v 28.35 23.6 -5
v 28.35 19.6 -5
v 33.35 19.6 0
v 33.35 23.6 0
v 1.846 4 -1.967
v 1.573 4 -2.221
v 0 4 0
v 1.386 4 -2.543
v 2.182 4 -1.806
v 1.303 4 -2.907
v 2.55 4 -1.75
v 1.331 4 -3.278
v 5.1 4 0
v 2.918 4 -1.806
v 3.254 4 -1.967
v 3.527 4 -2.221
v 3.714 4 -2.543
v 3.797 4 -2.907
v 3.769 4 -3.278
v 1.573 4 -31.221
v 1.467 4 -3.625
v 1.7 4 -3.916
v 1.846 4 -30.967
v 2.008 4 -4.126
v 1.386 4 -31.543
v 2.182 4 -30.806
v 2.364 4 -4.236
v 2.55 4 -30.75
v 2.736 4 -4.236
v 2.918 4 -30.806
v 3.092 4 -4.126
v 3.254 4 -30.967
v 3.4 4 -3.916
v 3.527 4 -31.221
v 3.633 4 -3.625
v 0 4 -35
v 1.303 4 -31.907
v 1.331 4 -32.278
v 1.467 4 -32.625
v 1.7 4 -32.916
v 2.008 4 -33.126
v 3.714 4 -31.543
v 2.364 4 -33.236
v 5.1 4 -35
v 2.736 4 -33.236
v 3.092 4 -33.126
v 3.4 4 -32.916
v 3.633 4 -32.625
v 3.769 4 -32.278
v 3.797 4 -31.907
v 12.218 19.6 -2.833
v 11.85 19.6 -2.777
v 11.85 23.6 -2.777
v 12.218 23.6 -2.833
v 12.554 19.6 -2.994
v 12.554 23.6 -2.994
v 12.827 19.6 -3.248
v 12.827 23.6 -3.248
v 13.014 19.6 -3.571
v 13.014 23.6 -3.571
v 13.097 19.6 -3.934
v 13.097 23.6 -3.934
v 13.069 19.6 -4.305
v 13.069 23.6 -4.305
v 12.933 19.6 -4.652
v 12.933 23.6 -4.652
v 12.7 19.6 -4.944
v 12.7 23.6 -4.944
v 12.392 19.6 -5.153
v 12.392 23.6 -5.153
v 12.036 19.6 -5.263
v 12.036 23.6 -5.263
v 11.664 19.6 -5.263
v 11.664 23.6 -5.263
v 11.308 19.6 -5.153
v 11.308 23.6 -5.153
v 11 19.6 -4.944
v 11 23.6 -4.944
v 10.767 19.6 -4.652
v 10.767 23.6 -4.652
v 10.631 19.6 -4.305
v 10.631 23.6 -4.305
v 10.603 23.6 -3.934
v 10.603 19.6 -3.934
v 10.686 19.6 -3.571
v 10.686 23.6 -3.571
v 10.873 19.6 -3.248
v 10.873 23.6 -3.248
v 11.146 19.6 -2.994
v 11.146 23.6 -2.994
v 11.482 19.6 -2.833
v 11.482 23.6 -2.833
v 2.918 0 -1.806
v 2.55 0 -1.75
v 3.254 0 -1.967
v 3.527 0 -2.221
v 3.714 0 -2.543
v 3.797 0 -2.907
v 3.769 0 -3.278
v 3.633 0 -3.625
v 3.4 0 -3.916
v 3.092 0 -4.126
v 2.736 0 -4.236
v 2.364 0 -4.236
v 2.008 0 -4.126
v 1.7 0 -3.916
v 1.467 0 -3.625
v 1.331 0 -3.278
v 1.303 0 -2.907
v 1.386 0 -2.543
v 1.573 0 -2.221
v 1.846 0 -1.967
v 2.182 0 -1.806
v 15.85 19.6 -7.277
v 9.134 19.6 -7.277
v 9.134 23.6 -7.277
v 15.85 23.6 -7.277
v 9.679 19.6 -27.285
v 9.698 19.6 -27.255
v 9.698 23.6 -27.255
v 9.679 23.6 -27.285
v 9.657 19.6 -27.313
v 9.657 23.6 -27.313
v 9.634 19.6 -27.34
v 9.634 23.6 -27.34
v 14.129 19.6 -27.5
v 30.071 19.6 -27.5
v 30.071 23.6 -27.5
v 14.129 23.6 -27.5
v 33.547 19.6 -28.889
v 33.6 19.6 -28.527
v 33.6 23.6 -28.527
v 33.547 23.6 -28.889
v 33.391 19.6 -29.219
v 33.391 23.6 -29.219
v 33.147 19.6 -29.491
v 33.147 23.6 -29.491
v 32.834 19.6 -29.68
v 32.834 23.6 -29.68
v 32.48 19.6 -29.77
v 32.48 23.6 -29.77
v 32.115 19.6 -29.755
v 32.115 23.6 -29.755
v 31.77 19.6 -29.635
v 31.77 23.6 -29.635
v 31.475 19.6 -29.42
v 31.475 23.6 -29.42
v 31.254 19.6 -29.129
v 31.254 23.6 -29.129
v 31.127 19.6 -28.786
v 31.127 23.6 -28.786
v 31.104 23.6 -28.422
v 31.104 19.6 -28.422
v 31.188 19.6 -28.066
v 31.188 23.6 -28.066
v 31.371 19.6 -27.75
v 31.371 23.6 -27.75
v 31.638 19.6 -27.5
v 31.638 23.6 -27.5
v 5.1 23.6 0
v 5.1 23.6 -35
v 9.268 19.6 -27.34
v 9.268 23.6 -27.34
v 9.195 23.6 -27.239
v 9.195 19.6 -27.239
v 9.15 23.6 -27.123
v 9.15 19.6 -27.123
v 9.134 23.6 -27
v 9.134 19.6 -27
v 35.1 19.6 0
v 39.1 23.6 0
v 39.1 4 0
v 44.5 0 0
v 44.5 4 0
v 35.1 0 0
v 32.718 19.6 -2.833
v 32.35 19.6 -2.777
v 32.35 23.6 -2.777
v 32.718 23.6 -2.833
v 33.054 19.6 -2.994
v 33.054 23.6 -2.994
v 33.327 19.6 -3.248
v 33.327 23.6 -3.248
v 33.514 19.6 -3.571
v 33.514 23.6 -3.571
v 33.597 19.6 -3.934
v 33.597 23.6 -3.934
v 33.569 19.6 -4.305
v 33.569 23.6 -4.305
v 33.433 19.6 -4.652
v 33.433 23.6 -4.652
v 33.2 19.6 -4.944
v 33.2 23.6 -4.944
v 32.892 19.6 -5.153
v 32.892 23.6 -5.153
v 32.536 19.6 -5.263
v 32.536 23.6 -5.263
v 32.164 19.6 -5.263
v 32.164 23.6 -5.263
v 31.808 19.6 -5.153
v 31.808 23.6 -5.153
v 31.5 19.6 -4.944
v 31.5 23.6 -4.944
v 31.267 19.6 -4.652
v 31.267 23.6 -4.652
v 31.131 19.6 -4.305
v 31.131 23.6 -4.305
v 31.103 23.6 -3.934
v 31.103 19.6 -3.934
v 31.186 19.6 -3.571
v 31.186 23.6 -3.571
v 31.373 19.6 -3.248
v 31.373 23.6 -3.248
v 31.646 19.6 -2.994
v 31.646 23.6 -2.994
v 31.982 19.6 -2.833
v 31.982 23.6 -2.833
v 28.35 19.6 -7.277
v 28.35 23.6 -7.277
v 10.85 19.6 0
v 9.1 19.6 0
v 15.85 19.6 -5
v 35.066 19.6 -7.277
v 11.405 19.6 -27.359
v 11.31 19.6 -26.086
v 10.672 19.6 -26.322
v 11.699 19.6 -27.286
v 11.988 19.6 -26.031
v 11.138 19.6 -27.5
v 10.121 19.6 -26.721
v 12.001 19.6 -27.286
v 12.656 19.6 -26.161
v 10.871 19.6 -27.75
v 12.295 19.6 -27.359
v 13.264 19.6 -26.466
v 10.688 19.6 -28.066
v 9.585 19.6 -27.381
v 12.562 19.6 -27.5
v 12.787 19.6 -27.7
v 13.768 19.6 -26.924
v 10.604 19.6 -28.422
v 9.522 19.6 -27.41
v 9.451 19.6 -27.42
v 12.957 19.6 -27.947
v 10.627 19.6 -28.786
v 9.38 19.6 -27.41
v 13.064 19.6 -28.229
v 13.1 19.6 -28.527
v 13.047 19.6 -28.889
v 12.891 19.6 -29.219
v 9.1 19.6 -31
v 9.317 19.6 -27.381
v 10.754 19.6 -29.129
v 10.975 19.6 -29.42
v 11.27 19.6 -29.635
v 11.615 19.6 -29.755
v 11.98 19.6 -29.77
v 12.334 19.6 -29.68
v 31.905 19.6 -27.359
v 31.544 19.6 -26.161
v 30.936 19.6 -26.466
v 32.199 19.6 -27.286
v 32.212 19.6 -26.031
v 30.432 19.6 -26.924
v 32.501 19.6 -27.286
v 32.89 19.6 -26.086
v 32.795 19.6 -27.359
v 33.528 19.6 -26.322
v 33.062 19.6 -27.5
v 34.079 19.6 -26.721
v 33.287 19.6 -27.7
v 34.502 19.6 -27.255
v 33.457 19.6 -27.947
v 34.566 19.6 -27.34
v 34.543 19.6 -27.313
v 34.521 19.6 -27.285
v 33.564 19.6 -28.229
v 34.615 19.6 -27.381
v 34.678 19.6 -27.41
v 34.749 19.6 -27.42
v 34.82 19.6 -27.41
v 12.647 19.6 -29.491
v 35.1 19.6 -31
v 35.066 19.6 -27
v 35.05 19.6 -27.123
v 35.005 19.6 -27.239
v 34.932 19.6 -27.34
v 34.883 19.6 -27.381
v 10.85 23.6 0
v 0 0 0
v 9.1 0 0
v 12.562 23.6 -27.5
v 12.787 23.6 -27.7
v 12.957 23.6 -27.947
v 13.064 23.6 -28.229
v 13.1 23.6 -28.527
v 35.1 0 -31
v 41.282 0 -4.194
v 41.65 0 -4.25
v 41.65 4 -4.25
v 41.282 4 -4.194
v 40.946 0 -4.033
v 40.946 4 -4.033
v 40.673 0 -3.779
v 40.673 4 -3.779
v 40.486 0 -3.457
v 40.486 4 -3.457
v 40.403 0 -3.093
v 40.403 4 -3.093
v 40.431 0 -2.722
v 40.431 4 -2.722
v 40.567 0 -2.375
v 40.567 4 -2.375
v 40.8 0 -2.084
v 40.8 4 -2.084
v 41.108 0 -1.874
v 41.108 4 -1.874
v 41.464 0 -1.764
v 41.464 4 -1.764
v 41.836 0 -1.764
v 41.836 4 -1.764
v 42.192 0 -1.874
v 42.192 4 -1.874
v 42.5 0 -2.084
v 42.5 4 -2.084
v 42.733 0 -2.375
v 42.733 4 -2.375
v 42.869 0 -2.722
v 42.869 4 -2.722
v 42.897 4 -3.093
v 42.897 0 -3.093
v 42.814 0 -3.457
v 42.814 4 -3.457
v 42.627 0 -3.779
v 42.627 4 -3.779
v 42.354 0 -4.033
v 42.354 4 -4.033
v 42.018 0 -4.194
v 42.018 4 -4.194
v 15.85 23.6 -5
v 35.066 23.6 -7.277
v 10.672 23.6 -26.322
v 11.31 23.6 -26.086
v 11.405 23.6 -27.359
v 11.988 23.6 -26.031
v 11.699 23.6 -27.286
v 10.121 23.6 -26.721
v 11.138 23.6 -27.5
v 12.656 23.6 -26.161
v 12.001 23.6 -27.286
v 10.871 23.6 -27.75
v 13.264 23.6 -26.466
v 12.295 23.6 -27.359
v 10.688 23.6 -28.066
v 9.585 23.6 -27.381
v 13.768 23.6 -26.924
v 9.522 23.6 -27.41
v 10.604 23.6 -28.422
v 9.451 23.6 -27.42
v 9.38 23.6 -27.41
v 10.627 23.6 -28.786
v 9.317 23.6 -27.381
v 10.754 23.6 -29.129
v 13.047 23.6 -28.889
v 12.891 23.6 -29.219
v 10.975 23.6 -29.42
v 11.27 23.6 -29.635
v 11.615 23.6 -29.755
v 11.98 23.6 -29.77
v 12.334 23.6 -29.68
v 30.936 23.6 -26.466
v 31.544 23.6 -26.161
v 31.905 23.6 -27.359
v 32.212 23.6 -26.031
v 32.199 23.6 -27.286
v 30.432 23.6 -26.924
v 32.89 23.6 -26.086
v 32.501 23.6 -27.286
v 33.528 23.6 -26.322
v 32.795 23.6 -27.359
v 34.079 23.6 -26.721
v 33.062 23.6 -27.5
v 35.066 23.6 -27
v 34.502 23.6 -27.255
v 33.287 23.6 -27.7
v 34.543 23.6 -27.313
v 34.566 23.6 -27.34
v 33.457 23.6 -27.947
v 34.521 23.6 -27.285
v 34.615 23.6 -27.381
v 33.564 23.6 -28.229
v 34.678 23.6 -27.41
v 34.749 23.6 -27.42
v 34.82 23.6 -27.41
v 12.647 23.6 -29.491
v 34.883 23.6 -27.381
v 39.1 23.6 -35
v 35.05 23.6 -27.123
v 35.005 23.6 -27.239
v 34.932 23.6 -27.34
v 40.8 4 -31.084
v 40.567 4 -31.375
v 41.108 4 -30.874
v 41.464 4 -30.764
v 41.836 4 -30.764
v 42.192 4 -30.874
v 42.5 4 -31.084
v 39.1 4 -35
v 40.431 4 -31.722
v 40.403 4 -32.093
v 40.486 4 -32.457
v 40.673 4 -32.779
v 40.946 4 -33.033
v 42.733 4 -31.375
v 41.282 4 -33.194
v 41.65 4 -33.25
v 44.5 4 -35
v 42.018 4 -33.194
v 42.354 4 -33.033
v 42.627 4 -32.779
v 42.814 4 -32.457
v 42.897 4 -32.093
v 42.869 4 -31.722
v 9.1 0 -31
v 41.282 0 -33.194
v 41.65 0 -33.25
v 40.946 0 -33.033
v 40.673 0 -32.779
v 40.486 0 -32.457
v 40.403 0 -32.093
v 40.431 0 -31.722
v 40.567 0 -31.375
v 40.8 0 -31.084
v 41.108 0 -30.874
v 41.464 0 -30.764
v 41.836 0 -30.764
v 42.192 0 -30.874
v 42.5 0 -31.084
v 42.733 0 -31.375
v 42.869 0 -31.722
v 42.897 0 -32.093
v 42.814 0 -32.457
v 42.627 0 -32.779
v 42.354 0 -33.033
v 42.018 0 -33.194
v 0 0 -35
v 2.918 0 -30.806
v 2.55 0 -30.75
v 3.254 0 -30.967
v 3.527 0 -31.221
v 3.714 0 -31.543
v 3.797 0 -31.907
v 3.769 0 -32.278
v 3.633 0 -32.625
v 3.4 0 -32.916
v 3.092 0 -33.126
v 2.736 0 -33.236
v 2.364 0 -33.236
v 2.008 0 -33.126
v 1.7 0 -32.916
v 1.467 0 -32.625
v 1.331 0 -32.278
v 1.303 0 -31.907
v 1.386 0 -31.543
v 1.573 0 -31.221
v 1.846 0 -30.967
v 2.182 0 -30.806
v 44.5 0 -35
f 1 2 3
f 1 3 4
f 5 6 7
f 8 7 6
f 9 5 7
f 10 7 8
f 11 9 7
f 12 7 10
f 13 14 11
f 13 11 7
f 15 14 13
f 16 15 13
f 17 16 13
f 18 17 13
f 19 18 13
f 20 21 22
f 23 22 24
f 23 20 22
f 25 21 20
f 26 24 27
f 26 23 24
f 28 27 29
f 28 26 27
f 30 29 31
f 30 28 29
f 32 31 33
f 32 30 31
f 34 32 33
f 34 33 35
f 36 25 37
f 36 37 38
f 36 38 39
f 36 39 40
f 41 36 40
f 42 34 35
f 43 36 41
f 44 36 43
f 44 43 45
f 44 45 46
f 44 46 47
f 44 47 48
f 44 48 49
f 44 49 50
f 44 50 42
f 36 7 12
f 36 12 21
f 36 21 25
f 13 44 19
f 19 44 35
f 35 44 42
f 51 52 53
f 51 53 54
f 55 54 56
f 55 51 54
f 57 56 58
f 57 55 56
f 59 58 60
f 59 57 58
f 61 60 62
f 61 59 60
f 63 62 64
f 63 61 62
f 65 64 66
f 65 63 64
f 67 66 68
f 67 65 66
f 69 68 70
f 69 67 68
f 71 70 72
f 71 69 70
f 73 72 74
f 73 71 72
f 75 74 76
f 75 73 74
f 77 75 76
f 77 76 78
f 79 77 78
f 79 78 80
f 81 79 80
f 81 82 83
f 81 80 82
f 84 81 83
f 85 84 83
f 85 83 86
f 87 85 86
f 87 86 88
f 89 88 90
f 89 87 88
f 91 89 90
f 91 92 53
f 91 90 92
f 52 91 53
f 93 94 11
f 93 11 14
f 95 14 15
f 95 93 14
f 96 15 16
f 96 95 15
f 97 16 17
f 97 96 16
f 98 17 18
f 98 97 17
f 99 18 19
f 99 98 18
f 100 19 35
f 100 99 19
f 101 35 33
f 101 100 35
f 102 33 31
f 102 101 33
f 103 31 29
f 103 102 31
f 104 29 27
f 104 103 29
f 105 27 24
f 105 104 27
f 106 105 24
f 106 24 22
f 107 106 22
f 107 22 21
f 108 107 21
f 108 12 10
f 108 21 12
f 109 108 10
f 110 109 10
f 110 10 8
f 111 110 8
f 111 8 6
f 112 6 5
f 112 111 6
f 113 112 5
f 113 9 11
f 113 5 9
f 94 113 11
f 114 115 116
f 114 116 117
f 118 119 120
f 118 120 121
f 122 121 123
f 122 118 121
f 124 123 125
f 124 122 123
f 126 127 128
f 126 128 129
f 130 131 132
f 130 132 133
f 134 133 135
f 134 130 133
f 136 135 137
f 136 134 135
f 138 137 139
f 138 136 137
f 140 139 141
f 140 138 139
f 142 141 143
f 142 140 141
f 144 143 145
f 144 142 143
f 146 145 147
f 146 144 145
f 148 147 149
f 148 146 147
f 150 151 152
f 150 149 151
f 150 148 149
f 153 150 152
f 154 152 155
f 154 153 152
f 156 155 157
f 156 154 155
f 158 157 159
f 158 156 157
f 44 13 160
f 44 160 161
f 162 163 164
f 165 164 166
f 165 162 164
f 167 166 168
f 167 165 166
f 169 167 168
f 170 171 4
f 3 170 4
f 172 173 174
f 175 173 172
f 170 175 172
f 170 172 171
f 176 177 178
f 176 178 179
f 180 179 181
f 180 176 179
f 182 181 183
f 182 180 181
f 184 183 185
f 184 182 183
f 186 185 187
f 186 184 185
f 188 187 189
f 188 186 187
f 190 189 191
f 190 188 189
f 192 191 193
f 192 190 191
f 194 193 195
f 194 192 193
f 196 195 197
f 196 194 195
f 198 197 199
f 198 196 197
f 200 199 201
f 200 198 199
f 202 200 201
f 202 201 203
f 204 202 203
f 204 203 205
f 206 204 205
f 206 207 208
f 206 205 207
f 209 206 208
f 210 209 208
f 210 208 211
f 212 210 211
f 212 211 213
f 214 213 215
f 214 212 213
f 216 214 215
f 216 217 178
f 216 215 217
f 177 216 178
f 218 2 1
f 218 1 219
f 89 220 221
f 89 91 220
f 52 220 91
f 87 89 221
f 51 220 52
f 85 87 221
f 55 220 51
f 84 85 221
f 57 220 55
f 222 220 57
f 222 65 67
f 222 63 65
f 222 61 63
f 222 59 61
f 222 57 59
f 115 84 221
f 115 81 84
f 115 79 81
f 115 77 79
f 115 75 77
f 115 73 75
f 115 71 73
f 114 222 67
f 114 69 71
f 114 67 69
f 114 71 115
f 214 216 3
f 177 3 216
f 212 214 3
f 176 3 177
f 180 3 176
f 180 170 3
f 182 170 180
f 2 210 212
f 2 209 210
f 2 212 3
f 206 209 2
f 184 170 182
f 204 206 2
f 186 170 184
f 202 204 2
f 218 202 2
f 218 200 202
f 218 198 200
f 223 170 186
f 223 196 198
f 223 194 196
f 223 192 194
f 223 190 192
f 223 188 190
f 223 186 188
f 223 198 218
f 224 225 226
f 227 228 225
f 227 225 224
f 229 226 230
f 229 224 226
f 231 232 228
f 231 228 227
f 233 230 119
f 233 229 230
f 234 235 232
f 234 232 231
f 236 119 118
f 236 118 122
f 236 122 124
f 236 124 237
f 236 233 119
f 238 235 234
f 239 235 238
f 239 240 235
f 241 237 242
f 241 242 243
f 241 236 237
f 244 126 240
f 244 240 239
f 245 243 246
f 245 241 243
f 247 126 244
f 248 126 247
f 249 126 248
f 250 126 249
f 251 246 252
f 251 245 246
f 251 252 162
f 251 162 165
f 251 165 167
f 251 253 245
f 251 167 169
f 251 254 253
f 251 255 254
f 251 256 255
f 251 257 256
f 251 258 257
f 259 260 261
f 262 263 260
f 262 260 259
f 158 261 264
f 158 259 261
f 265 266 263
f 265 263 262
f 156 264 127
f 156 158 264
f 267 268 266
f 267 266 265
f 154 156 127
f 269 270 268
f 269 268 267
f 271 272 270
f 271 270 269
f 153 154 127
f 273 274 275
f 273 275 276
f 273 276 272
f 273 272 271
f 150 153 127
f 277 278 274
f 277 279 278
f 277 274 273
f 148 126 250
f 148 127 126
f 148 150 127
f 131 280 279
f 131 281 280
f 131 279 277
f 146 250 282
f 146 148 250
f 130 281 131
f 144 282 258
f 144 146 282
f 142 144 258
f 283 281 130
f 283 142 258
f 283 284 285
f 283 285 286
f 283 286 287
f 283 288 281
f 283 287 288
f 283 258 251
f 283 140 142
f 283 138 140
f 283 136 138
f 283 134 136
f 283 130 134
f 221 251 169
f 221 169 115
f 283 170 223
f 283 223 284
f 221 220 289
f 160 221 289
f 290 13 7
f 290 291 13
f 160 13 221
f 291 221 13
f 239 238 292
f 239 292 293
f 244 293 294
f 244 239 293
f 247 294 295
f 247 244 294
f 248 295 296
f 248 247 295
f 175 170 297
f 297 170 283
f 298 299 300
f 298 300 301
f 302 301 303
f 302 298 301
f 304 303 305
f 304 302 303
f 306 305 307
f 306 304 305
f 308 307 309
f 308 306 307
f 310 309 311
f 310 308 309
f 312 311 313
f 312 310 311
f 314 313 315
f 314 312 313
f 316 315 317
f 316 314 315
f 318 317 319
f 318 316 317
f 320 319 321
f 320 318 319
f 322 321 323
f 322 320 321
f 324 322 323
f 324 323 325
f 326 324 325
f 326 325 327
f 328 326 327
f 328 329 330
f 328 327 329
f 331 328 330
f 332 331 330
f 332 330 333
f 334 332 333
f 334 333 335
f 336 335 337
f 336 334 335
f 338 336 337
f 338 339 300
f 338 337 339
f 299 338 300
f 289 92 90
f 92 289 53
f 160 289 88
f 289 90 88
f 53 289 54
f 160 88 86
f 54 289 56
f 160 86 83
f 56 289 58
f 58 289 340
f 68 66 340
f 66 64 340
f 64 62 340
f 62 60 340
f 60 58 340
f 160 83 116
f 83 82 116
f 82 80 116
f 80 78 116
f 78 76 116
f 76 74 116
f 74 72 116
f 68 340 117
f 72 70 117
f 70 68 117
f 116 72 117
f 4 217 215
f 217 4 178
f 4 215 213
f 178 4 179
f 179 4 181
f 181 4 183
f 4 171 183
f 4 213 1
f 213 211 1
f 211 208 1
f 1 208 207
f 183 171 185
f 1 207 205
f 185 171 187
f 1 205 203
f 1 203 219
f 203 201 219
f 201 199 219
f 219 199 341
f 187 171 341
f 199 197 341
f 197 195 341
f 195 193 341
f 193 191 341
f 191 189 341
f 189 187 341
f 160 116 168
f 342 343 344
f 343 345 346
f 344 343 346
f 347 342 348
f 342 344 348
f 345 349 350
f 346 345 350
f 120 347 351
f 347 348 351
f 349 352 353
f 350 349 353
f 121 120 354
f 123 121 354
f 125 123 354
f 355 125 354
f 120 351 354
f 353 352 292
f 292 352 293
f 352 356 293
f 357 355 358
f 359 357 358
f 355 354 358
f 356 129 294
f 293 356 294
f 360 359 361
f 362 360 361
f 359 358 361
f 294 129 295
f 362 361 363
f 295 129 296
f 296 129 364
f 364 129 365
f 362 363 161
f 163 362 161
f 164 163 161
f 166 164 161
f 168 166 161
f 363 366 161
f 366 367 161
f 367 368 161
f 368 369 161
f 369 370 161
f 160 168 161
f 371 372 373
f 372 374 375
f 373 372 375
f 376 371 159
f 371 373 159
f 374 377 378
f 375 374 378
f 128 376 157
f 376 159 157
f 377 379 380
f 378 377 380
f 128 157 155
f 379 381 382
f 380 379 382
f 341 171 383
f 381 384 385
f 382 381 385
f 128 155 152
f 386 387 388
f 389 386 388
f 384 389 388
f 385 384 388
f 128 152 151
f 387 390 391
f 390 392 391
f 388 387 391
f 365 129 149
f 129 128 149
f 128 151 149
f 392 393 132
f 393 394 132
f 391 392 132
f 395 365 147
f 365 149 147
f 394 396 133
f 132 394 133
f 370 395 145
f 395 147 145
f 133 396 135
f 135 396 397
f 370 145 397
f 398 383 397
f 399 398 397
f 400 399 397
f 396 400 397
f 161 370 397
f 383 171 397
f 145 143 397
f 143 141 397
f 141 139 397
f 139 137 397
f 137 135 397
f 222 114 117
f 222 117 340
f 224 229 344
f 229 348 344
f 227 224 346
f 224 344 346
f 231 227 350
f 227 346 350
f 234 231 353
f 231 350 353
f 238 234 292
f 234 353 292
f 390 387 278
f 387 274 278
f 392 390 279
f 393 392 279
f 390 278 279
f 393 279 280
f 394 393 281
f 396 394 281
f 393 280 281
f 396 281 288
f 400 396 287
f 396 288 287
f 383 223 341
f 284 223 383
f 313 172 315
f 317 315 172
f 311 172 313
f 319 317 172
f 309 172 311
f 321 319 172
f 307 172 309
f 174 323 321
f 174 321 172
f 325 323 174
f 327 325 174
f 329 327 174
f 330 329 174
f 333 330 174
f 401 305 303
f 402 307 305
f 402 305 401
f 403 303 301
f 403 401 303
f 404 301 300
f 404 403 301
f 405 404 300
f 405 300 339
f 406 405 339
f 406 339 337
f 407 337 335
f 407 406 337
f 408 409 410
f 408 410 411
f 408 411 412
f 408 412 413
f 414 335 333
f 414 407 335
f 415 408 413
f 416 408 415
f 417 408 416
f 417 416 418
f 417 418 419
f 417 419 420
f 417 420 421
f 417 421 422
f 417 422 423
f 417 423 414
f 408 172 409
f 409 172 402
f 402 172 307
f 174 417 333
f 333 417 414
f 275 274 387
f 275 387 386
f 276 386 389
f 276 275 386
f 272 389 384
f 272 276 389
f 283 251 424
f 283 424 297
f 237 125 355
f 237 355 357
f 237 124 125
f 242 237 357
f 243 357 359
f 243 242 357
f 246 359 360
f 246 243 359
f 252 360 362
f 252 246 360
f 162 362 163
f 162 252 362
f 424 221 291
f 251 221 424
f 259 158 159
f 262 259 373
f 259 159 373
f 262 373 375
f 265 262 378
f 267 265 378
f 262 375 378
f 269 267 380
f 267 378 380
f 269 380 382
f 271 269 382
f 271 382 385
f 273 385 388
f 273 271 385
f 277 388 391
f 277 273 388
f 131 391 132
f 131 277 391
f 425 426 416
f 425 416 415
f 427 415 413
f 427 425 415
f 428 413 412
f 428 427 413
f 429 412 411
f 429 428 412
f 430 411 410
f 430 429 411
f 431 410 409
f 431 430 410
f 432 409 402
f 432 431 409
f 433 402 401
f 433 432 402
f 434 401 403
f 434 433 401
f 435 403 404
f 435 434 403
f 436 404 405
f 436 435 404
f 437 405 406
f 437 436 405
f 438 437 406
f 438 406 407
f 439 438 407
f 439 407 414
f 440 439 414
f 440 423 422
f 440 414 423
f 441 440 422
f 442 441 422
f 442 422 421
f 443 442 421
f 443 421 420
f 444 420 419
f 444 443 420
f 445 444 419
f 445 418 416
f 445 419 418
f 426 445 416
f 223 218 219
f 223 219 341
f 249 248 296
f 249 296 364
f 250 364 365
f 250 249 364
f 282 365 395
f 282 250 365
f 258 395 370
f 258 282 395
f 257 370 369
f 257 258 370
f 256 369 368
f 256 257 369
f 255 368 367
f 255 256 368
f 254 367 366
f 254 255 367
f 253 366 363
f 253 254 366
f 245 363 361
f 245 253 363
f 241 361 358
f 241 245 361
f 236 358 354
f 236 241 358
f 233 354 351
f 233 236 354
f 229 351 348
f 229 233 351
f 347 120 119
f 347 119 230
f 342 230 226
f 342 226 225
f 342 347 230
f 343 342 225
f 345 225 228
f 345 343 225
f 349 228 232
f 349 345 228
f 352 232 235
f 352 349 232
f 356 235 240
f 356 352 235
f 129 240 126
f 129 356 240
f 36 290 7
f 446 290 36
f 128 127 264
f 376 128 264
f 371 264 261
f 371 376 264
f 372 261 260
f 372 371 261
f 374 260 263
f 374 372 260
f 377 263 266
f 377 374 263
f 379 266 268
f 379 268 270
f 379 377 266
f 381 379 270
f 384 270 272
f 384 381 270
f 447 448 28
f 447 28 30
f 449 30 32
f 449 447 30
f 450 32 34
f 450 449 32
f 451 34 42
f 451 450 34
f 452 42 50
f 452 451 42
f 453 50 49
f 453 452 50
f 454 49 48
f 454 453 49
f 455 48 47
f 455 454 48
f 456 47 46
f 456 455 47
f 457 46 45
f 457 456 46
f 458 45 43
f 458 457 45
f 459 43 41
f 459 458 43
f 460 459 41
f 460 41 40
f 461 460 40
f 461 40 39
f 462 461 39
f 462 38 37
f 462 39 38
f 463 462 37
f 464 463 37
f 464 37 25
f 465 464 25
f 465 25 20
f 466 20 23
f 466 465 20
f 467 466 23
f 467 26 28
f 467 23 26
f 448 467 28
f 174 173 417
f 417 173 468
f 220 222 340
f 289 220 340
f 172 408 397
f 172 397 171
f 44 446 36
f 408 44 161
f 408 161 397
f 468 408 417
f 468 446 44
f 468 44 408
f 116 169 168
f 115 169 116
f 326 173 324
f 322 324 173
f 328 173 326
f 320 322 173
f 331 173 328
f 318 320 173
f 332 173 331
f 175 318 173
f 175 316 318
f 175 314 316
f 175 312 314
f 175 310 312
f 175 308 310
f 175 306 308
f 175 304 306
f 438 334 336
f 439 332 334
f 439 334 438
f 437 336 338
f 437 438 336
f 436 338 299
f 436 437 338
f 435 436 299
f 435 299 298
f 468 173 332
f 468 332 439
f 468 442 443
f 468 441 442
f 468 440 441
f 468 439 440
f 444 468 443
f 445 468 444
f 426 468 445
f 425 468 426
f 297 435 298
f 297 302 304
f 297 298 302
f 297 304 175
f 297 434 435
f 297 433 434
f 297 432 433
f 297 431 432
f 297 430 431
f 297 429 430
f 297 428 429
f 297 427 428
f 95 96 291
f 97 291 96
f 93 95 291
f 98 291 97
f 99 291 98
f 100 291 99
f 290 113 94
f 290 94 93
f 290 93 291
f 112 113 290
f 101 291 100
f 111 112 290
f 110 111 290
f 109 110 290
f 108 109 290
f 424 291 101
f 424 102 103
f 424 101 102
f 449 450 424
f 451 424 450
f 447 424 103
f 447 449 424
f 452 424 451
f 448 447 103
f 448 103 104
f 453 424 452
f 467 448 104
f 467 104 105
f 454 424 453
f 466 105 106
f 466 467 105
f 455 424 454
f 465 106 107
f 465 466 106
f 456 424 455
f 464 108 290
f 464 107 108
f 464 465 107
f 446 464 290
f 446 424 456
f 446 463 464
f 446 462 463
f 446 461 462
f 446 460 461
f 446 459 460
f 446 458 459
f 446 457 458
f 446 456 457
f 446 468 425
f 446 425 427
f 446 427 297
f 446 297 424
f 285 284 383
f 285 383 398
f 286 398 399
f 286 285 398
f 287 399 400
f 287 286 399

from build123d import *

# Parameters (mm, degrees)
SKETCH1_W               = 44.5
SKETCH1_H               = 35
BOSS_EXTRUDE1_DEPTH     = 4
BOSS_EXTRUDE2_DEPTH     = 19.6
SKETCH4_W               = 26
SKETCH4_H               = 31
CUT_EXTRUDE1_DEPTH      = 4
BOSS_EXTRUDE3_DEPTH     = 4
CHAMFER1_SIZE           = 5
CUT_EXTRUDE2_DEPTH      = 62.336856783
CUT_EXTRUDE2_DEPTH_BACK = 62.336856783
SKETCH6_R               = 1.25
SKETCH7_R               = 2.5
SKETCH7_R_2             = 1.25
BOSS_EXTRUDE4_DEPTH     = 4
FILLET1_R               = 0.5
FILLET3_R               = 0.25
CUT_EXTRUDE3_DEPTH      = 60.911685095
CUT_EXTRUDE3_DEPTH_BACK = 60.911685095
SKETCH8_R               = 1.25


with BuildPart() as part:
    # Sketch1 → Boss-Extrude1 (new body)
    with BuildSketch(Plane(origin=(0, 0, 0), x_dir=(1, 0, 0), z_dir=(0, 1, 0))):
        with Locations((22.25, 17.5)):
            Rectangle(SKETCH1_W, SKETCH1_H)
    extrude(amount=BOSS_EXTRUDE1_DEPTH)

    # Sketch3 → Boss-Extrude2 (add)
    with BuildSketch(Plane(origin=(0, 0, 0), x_dir=(1, 0, 0), z_dir=(0, 1, 0))):
        Polygon((9.1, 31), (9.1, 0), (5.1, 0), (5.1, 35), (39.1, 35), (39.1, 0), (35.1, 0), (35.1, 31), align=None)
    extrude(amount=BOSS_EXTRUDE2_DEPTH)

    # Sketch4 → Cut-Extrude1 (cut)
    with BuildSketch(Plane(origin=(0, 4, 0), x_dir=(1, 0, 0), z_dir=(0, 1, 0))):
        with Locations((22.1, 15.5)):
            Rectangle(SKETCH4_W, SKETCH4_H)
    extrude(amount=-CUT_EXTRUDE1_DEPTH, mode=Mode.SUBTRACT)

    # Sketch5 → Boss-Extrude3 (add)
    with BuildSketch(Plane(origin=(0, 19.6, 0), x_dir=(1, 0, 0), z_dir=(0, 1, 0))):
        Polygon((15.85, 0), (5.1, 0), (5.1, 35), (39.1, 35), (39.1, 0), (28.35, 0), (28.35, 7.277215151), (35.065893154, 7.277215151), (35.065893154, 27.5), (9.134106846, 27.5), (9.134106846, 7.277215151), (15.85, 7.277215151), align=None)
    extrude(amount=BOSS_EXTRUDE3_DEPTH)

    # Chamfer1
    chamfer1_edges = [part.edges().sort_by_distance(p)[0] for p in [
        (15.85, 21.6, 0),
        (28.35, 21.6, 0),
    ]]
    chamfer(chamfer1_edges, length=CHAMFER1_SIZE)

    # Sketch6 → Cut-Extrude2 (cut, two sides: drawn at the far end of the back side and taken through both)
    with BuildSketch(Plane(origin=(0, 23.6, 0), x_dir=(1, 0, 0), z_dir=(0, 1, 0)).offset(-CUT_EXTRUDE2_DEPTH_BACK)):
        with Locations(Location((11.85, 4.027215151, 0), (0, 0, 270))):
            Circle(SKETCH6_R)
        with Locations(Location((32.35, 4.027215151, 0), (0, 0, 270))):
            Circle(SKETCH6_R)
        with BuildLine():
            ThreePointArc((11.137729662, 27.5), (11.85, 27.277215151), (12.562270338, 27.5))
            Line((12.562270338, 27.5), (11.137729662, 27.5))
        make_face()
        with BuildLine():
            Line((11.137729662, 27.5), (12.562270338, 27.5))
            ThreePointArc((12.562270338, 27.5), (12.957438017, 27.947490182), (13.1, 28.527215151))
            ThreePointArc((13.1, 28.527215151), (11.270275032, 29.634653168), (11.137729662, 27.5))
        make_face()
        with BuildLine():
            ThreePointArc((33.062270338, 27.5), (33.457438017, 27.947490182), (33.6, 28.527215151))
            ThreePointArc((33.6, 28.527215151), (31.770275032, 29.634653168), (31.637729662, 27.5))
            Line((31.637729662, 27.5), (33.062270338, 27.5))
        make_face()
        with BuildLine():
            Line((33.062270338, 27.5), (31.637729662, 27.5))
            ThreePointArc((31.637729662, 27.5), (32.35, 27.277215151), (33.062270338, 27.5))
        make_face()
    extrude(amount=CUT_EXTRUDE2_DEPTH + CUT_EXTRUDE2_DEPTH_BACK, mode=Mode.SUBTRACT)

    # Sketch7 → Boss-Extrude4 (add)
    # profile 1 of 2: a face of its own
    with BuildSketch(Plane(origin=(0, 23.6, 0), x_dir=(1, 0, 0), z_dir=(0, 1, 0))):
        with Locations((11.85, 28.527215151)):
            Circle(SKETCH7_R)
        with Locations(Location((11.85, 28.527215151, 0), (0, 0, 270))):
            Circle(SKETCH7_R_2, mode=Mode.SUBTRACT)
    # profile 2 of 2: a face of its own
    with BuildSketch(Plane(origin=(0, 23.6, 0), x_dir=(1, 0, 0), z_dir=(0, 1, 0))):
        with Locations((32.35, 28.527215151)):
            Circle(SKETCH7_R)
        with Locations(Location((32.35, 28.527215151, 0), (0, 0, 270))):
            Circle(SKETCH7_R_2, mode=Mode.SUBTRACT)
    extrude(amount=-BOSS_EXTRUDE4_DEPTH)

    # Fillet1
    # the kernel refuses this fillet: 0.5 mm, written as the material it adds along each edge
    with BuildSketch(Plane(origin=(35.065893154, 19.6, -27.5), x_dir=(0, 0, 1), z_dir=(0, 1, 0)), Plane(origin=(9.134106846, 19.6, -27.5), x_dir=(1, 0, 0), z_dir=(0, 1, 0))) as fillet1_piece_1:
        with BuildLine():
            CenterArc((FILLET1_R, -FILLET1_R), FILLET1_R, 90, 90)
            Line((0, -FILLET1_R), (0, 0))
            Line((0, 0), (FILLET1_R, 0))
        make_face()
    extrude(amount=4)
    with BuildSketch(Plane(origin=(34.629216759, 19.6, -27.5), x_dir=(1, 0, 0), z_dir=(0, 1, 0))) as fillet1_piece_2:
        with BuildLine():
            CenterArc((0.30295556, -0.5), FILLET1_R, 90, 59.397982961)
            ThreePointArc((-0.127406493, -0.245464142), (-0.060306377, -0.124495193), (0, 0))
            Line((0, 0), (0.30295556, 0))
        make_face()
    extrude(amount=4)
    with BuildSketch(Plane(origin=(9.570783241, 19.6, -27.5), x_dir=(0.46068413755870835, 0, 0.8875641528372973), z_dir=(0, 1, 0))) as fillet1_piece_3:
        with BuildLine():
            CenterArc((0.304215256, -0.499234564), FILLET1_R, 93.170754575, 59.397982961)
            Line((-0.139566821, -0.268892495), (0, 0))
            ThreePointArc((0, 0), (0.138279662, -0.003827182), (0.276559323, 0))
        make_face()
    extrude(amount=4)

    # Fillet3
    fillet3_edges = [part.edges().sort_by_distance(p)[0] for p in [
        (34.749032737, 21.6, -27.465252505),
        (9.450967263, 21.6, -27.465252505),
    ]]
    fillet(fillet3_edges, radius=FILLET3_R)

    # Sketch8 → Cut-Extrude3 (cut, two sides: drawn at the far end of the back side and taken through both)
    with BuildSketch(Plane(origin=(0, 4, 0), x_dir=(1, 0, 0), z_dir=(0, 1, 0)).offset(-CUT_EXTRUDE3_DEPTH_BACK)):
        with Locations(Location((2.55, 32, 0), (0, 0, 270))):
            Circle(SKETCH8_R)
        with Locations(Location((41.65, 32, 0), (0, 0, 90))):
            Circle(SKETCH8_R)
        with Locations(Location((2.55, 3, 0), (0, 0, 270))):
            Circle(SKETCH8_R)
        with Locations(Location((41.65, 3, 0), (0, 0, 90))):
            Circle(SKETCH8_R)
    extrude(amount=CUT_EXTRUDE3_DEPTH + CUT_EXTRUDE3_DEPTH_BACK, mode=Mode.SUBTRACT)


solid = part.part
